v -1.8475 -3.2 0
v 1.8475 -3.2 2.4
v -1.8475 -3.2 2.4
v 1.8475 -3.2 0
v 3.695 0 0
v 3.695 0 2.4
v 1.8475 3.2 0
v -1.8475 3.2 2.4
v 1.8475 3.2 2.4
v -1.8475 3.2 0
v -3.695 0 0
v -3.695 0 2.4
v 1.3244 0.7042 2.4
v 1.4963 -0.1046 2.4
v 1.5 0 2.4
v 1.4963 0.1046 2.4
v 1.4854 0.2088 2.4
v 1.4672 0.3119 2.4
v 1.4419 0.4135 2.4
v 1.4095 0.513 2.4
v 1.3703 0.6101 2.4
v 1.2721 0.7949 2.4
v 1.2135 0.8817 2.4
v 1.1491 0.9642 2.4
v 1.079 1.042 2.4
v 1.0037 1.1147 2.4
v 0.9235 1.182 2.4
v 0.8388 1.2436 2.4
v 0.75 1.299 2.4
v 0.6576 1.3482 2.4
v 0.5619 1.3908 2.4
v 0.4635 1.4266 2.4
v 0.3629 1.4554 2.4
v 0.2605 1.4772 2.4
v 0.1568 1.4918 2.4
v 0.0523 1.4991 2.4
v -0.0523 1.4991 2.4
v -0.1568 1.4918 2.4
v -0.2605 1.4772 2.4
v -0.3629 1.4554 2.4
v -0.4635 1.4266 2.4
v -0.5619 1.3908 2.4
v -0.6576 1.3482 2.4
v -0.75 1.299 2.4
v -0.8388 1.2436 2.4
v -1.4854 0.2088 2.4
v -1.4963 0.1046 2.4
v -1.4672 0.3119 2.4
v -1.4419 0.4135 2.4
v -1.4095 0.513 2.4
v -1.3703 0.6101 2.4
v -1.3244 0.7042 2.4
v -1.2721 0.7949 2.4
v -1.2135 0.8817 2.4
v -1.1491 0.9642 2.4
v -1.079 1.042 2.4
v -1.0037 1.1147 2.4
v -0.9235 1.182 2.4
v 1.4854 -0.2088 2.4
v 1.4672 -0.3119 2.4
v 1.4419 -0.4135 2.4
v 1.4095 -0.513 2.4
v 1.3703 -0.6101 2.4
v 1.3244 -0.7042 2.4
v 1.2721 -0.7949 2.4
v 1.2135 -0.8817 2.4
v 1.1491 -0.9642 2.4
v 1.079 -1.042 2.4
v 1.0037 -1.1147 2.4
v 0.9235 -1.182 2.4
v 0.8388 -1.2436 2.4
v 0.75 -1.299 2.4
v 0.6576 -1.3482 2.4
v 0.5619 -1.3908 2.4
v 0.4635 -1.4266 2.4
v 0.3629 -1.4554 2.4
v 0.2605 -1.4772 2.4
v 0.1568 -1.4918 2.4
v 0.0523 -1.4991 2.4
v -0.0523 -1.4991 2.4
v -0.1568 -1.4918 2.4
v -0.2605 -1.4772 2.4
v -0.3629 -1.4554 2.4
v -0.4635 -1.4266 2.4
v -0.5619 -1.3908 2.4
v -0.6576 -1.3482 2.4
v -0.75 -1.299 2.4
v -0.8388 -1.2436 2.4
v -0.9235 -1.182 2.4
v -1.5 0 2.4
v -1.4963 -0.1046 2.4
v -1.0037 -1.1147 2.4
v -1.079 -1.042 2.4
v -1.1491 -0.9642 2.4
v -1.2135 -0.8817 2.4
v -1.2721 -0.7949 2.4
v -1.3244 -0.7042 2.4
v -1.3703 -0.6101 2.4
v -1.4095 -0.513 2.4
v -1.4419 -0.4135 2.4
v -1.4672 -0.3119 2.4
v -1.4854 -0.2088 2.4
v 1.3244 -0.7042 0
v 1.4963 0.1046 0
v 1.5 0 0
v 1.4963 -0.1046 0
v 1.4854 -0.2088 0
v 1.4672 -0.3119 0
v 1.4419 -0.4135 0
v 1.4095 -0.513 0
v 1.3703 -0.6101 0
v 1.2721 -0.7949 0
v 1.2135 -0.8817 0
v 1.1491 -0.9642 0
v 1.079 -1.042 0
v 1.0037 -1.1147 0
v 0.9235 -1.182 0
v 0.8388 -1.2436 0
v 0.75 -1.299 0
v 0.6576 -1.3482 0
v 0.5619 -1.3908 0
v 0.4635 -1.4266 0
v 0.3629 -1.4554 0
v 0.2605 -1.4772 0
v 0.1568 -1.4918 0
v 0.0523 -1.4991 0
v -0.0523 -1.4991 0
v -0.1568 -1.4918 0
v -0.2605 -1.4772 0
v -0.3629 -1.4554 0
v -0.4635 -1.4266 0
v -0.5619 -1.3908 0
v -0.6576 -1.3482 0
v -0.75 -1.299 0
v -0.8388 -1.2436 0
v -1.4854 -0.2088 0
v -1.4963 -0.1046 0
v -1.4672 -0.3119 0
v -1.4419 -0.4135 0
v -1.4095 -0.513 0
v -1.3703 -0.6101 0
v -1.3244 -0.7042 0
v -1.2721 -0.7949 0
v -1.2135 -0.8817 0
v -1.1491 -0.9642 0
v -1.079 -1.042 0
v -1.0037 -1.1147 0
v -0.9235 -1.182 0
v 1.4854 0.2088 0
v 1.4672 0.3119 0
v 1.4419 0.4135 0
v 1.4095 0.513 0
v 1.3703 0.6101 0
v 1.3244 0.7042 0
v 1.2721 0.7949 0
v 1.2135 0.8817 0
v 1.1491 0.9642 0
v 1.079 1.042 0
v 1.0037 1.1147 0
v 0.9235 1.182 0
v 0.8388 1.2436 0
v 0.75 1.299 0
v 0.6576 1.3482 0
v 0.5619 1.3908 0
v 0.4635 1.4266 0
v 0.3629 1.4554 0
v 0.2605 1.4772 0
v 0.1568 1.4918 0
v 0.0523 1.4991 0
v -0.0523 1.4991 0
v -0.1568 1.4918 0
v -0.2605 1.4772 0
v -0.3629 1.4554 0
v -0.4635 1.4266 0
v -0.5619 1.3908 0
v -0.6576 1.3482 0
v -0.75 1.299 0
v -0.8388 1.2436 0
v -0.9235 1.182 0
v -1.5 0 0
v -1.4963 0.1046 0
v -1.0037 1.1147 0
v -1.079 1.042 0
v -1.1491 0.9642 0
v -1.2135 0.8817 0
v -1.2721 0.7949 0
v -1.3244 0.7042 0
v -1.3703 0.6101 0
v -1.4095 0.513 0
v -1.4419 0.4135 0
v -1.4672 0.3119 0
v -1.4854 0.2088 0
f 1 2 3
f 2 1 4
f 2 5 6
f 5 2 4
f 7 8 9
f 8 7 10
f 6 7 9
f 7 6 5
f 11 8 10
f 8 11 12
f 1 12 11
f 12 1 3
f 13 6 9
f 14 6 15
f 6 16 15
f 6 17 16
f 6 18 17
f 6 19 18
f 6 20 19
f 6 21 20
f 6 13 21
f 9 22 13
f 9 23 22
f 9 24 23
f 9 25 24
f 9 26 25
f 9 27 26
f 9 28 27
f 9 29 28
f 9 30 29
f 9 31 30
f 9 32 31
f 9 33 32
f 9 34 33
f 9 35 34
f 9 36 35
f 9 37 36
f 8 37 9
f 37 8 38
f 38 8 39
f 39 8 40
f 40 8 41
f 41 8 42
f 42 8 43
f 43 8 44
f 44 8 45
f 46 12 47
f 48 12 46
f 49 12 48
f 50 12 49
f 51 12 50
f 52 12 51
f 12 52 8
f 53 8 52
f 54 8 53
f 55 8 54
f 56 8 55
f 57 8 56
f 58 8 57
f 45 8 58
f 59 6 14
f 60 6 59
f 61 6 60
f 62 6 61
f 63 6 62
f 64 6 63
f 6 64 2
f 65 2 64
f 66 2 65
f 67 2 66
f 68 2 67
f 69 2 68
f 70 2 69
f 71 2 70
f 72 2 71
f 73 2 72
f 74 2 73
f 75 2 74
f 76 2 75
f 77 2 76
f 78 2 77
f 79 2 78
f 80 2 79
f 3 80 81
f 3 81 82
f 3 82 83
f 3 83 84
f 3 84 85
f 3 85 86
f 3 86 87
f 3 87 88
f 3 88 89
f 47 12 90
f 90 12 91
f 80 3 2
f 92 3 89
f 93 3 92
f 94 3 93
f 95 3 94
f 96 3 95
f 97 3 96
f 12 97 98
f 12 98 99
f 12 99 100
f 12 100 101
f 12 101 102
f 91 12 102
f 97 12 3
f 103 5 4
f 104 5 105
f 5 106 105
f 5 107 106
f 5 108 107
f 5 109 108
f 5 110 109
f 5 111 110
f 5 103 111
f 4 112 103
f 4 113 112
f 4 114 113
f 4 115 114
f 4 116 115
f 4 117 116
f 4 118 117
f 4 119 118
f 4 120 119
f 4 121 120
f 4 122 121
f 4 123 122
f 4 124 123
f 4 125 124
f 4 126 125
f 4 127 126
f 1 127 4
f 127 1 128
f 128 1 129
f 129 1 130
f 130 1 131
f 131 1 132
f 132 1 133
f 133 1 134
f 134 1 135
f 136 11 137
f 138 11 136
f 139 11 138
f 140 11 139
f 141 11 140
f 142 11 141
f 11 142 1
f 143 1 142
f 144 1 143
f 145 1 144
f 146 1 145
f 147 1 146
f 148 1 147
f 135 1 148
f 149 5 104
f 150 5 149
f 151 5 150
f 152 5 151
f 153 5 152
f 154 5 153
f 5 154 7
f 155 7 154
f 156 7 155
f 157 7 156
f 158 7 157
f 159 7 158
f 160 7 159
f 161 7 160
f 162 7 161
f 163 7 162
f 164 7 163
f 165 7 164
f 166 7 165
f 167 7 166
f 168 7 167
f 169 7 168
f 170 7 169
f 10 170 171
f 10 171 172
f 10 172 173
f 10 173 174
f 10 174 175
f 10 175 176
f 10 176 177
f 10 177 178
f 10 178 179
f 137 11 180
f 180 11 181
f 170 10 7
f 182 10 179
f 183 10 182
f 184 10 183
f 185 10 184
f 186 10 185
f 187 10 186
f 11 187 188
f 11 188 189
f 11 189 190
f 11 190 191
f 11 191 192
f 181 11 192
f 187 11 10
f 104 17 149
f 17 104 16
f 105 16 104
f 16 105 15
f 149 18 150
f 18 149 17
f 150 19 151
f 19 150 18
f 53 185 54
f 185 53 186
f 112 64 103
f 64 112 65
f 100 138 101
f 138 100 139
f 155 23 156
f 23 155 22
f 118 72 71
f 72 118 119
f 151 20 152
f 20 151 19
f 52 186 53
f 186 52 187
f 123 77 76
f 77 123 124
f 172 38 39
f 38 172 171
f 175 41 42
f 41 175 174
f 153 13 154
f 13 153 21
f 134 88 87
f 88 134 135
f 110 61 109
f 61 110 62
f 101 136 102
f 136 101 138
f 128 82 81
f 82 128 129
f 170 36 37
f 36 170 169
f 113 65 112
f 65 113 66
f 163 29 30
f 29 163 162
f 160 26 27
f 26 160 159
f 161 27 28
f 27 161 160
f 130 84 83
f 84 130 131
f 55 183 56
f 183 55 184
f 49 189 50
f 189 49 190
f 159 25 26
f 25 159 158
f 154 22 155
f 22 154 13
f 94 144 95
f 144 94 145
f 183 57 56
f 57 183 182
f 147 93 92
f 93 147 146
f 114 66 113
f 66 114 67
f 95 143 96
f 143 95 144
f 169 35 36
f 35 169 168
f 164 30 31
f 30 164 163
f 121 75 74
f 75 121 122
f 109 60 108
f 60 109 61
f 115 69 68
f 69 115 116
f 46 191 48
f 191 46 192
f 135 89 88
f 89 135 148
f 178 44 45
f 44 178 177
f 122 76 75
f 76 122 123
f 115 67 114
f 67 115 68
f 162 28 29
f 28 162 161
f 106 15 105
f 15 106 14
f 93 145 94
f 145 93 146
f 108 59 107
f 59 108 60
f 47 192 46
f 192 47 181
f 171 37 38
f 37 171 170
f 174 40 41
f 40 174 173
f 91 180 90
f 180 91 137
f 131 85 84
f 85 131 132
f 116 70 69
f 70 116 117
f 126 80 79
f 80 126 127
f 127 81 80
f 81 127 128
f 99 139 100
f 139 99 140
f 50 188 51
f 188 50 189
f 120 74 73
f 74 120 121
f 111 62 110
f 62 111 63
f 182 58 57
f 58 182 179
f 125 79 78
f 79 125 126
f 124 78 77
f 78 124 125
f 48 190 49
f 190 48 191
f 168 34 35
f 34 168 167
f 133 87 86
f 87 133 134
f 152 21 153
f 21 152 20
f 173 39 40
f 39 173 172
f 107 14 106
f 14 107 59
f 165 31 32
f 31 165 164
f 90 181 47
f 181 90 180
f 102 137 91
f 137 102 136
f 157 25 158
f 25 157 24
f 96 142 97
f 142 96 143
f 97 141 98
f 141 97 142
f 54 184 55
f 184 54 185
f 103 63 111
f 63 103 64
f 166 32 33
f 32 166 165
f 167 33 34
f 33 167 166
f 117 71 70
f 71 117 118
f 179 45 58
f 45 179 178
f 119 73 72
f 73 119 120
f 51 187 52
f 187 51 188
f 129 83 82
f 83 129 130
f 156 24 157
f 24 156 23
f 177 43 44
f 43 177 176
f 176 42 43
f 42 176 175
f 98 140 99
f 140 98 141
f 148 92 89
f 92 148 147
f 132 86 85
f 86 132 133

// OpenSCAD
$fn = 120;

across_flats = 6.4;   // mm
thickness    = 2.4;   // mm
hole_d       = 3.0;   // mm (clearance as specified)

module hex_prism_af(af, h) {
    // For a regular hexagon: across_flats = sqrt(3) * circumradius
    r = af / sqrt(3);
    cylinder(h = h, r = r, $fn = 6);
}

difference() {
    hex_prism_af(across_flats, thickness);
    translate([0,0,-0.2])
        cylinder(h = thickness + 0.4, d = hole_d, $fn = 90);
}
